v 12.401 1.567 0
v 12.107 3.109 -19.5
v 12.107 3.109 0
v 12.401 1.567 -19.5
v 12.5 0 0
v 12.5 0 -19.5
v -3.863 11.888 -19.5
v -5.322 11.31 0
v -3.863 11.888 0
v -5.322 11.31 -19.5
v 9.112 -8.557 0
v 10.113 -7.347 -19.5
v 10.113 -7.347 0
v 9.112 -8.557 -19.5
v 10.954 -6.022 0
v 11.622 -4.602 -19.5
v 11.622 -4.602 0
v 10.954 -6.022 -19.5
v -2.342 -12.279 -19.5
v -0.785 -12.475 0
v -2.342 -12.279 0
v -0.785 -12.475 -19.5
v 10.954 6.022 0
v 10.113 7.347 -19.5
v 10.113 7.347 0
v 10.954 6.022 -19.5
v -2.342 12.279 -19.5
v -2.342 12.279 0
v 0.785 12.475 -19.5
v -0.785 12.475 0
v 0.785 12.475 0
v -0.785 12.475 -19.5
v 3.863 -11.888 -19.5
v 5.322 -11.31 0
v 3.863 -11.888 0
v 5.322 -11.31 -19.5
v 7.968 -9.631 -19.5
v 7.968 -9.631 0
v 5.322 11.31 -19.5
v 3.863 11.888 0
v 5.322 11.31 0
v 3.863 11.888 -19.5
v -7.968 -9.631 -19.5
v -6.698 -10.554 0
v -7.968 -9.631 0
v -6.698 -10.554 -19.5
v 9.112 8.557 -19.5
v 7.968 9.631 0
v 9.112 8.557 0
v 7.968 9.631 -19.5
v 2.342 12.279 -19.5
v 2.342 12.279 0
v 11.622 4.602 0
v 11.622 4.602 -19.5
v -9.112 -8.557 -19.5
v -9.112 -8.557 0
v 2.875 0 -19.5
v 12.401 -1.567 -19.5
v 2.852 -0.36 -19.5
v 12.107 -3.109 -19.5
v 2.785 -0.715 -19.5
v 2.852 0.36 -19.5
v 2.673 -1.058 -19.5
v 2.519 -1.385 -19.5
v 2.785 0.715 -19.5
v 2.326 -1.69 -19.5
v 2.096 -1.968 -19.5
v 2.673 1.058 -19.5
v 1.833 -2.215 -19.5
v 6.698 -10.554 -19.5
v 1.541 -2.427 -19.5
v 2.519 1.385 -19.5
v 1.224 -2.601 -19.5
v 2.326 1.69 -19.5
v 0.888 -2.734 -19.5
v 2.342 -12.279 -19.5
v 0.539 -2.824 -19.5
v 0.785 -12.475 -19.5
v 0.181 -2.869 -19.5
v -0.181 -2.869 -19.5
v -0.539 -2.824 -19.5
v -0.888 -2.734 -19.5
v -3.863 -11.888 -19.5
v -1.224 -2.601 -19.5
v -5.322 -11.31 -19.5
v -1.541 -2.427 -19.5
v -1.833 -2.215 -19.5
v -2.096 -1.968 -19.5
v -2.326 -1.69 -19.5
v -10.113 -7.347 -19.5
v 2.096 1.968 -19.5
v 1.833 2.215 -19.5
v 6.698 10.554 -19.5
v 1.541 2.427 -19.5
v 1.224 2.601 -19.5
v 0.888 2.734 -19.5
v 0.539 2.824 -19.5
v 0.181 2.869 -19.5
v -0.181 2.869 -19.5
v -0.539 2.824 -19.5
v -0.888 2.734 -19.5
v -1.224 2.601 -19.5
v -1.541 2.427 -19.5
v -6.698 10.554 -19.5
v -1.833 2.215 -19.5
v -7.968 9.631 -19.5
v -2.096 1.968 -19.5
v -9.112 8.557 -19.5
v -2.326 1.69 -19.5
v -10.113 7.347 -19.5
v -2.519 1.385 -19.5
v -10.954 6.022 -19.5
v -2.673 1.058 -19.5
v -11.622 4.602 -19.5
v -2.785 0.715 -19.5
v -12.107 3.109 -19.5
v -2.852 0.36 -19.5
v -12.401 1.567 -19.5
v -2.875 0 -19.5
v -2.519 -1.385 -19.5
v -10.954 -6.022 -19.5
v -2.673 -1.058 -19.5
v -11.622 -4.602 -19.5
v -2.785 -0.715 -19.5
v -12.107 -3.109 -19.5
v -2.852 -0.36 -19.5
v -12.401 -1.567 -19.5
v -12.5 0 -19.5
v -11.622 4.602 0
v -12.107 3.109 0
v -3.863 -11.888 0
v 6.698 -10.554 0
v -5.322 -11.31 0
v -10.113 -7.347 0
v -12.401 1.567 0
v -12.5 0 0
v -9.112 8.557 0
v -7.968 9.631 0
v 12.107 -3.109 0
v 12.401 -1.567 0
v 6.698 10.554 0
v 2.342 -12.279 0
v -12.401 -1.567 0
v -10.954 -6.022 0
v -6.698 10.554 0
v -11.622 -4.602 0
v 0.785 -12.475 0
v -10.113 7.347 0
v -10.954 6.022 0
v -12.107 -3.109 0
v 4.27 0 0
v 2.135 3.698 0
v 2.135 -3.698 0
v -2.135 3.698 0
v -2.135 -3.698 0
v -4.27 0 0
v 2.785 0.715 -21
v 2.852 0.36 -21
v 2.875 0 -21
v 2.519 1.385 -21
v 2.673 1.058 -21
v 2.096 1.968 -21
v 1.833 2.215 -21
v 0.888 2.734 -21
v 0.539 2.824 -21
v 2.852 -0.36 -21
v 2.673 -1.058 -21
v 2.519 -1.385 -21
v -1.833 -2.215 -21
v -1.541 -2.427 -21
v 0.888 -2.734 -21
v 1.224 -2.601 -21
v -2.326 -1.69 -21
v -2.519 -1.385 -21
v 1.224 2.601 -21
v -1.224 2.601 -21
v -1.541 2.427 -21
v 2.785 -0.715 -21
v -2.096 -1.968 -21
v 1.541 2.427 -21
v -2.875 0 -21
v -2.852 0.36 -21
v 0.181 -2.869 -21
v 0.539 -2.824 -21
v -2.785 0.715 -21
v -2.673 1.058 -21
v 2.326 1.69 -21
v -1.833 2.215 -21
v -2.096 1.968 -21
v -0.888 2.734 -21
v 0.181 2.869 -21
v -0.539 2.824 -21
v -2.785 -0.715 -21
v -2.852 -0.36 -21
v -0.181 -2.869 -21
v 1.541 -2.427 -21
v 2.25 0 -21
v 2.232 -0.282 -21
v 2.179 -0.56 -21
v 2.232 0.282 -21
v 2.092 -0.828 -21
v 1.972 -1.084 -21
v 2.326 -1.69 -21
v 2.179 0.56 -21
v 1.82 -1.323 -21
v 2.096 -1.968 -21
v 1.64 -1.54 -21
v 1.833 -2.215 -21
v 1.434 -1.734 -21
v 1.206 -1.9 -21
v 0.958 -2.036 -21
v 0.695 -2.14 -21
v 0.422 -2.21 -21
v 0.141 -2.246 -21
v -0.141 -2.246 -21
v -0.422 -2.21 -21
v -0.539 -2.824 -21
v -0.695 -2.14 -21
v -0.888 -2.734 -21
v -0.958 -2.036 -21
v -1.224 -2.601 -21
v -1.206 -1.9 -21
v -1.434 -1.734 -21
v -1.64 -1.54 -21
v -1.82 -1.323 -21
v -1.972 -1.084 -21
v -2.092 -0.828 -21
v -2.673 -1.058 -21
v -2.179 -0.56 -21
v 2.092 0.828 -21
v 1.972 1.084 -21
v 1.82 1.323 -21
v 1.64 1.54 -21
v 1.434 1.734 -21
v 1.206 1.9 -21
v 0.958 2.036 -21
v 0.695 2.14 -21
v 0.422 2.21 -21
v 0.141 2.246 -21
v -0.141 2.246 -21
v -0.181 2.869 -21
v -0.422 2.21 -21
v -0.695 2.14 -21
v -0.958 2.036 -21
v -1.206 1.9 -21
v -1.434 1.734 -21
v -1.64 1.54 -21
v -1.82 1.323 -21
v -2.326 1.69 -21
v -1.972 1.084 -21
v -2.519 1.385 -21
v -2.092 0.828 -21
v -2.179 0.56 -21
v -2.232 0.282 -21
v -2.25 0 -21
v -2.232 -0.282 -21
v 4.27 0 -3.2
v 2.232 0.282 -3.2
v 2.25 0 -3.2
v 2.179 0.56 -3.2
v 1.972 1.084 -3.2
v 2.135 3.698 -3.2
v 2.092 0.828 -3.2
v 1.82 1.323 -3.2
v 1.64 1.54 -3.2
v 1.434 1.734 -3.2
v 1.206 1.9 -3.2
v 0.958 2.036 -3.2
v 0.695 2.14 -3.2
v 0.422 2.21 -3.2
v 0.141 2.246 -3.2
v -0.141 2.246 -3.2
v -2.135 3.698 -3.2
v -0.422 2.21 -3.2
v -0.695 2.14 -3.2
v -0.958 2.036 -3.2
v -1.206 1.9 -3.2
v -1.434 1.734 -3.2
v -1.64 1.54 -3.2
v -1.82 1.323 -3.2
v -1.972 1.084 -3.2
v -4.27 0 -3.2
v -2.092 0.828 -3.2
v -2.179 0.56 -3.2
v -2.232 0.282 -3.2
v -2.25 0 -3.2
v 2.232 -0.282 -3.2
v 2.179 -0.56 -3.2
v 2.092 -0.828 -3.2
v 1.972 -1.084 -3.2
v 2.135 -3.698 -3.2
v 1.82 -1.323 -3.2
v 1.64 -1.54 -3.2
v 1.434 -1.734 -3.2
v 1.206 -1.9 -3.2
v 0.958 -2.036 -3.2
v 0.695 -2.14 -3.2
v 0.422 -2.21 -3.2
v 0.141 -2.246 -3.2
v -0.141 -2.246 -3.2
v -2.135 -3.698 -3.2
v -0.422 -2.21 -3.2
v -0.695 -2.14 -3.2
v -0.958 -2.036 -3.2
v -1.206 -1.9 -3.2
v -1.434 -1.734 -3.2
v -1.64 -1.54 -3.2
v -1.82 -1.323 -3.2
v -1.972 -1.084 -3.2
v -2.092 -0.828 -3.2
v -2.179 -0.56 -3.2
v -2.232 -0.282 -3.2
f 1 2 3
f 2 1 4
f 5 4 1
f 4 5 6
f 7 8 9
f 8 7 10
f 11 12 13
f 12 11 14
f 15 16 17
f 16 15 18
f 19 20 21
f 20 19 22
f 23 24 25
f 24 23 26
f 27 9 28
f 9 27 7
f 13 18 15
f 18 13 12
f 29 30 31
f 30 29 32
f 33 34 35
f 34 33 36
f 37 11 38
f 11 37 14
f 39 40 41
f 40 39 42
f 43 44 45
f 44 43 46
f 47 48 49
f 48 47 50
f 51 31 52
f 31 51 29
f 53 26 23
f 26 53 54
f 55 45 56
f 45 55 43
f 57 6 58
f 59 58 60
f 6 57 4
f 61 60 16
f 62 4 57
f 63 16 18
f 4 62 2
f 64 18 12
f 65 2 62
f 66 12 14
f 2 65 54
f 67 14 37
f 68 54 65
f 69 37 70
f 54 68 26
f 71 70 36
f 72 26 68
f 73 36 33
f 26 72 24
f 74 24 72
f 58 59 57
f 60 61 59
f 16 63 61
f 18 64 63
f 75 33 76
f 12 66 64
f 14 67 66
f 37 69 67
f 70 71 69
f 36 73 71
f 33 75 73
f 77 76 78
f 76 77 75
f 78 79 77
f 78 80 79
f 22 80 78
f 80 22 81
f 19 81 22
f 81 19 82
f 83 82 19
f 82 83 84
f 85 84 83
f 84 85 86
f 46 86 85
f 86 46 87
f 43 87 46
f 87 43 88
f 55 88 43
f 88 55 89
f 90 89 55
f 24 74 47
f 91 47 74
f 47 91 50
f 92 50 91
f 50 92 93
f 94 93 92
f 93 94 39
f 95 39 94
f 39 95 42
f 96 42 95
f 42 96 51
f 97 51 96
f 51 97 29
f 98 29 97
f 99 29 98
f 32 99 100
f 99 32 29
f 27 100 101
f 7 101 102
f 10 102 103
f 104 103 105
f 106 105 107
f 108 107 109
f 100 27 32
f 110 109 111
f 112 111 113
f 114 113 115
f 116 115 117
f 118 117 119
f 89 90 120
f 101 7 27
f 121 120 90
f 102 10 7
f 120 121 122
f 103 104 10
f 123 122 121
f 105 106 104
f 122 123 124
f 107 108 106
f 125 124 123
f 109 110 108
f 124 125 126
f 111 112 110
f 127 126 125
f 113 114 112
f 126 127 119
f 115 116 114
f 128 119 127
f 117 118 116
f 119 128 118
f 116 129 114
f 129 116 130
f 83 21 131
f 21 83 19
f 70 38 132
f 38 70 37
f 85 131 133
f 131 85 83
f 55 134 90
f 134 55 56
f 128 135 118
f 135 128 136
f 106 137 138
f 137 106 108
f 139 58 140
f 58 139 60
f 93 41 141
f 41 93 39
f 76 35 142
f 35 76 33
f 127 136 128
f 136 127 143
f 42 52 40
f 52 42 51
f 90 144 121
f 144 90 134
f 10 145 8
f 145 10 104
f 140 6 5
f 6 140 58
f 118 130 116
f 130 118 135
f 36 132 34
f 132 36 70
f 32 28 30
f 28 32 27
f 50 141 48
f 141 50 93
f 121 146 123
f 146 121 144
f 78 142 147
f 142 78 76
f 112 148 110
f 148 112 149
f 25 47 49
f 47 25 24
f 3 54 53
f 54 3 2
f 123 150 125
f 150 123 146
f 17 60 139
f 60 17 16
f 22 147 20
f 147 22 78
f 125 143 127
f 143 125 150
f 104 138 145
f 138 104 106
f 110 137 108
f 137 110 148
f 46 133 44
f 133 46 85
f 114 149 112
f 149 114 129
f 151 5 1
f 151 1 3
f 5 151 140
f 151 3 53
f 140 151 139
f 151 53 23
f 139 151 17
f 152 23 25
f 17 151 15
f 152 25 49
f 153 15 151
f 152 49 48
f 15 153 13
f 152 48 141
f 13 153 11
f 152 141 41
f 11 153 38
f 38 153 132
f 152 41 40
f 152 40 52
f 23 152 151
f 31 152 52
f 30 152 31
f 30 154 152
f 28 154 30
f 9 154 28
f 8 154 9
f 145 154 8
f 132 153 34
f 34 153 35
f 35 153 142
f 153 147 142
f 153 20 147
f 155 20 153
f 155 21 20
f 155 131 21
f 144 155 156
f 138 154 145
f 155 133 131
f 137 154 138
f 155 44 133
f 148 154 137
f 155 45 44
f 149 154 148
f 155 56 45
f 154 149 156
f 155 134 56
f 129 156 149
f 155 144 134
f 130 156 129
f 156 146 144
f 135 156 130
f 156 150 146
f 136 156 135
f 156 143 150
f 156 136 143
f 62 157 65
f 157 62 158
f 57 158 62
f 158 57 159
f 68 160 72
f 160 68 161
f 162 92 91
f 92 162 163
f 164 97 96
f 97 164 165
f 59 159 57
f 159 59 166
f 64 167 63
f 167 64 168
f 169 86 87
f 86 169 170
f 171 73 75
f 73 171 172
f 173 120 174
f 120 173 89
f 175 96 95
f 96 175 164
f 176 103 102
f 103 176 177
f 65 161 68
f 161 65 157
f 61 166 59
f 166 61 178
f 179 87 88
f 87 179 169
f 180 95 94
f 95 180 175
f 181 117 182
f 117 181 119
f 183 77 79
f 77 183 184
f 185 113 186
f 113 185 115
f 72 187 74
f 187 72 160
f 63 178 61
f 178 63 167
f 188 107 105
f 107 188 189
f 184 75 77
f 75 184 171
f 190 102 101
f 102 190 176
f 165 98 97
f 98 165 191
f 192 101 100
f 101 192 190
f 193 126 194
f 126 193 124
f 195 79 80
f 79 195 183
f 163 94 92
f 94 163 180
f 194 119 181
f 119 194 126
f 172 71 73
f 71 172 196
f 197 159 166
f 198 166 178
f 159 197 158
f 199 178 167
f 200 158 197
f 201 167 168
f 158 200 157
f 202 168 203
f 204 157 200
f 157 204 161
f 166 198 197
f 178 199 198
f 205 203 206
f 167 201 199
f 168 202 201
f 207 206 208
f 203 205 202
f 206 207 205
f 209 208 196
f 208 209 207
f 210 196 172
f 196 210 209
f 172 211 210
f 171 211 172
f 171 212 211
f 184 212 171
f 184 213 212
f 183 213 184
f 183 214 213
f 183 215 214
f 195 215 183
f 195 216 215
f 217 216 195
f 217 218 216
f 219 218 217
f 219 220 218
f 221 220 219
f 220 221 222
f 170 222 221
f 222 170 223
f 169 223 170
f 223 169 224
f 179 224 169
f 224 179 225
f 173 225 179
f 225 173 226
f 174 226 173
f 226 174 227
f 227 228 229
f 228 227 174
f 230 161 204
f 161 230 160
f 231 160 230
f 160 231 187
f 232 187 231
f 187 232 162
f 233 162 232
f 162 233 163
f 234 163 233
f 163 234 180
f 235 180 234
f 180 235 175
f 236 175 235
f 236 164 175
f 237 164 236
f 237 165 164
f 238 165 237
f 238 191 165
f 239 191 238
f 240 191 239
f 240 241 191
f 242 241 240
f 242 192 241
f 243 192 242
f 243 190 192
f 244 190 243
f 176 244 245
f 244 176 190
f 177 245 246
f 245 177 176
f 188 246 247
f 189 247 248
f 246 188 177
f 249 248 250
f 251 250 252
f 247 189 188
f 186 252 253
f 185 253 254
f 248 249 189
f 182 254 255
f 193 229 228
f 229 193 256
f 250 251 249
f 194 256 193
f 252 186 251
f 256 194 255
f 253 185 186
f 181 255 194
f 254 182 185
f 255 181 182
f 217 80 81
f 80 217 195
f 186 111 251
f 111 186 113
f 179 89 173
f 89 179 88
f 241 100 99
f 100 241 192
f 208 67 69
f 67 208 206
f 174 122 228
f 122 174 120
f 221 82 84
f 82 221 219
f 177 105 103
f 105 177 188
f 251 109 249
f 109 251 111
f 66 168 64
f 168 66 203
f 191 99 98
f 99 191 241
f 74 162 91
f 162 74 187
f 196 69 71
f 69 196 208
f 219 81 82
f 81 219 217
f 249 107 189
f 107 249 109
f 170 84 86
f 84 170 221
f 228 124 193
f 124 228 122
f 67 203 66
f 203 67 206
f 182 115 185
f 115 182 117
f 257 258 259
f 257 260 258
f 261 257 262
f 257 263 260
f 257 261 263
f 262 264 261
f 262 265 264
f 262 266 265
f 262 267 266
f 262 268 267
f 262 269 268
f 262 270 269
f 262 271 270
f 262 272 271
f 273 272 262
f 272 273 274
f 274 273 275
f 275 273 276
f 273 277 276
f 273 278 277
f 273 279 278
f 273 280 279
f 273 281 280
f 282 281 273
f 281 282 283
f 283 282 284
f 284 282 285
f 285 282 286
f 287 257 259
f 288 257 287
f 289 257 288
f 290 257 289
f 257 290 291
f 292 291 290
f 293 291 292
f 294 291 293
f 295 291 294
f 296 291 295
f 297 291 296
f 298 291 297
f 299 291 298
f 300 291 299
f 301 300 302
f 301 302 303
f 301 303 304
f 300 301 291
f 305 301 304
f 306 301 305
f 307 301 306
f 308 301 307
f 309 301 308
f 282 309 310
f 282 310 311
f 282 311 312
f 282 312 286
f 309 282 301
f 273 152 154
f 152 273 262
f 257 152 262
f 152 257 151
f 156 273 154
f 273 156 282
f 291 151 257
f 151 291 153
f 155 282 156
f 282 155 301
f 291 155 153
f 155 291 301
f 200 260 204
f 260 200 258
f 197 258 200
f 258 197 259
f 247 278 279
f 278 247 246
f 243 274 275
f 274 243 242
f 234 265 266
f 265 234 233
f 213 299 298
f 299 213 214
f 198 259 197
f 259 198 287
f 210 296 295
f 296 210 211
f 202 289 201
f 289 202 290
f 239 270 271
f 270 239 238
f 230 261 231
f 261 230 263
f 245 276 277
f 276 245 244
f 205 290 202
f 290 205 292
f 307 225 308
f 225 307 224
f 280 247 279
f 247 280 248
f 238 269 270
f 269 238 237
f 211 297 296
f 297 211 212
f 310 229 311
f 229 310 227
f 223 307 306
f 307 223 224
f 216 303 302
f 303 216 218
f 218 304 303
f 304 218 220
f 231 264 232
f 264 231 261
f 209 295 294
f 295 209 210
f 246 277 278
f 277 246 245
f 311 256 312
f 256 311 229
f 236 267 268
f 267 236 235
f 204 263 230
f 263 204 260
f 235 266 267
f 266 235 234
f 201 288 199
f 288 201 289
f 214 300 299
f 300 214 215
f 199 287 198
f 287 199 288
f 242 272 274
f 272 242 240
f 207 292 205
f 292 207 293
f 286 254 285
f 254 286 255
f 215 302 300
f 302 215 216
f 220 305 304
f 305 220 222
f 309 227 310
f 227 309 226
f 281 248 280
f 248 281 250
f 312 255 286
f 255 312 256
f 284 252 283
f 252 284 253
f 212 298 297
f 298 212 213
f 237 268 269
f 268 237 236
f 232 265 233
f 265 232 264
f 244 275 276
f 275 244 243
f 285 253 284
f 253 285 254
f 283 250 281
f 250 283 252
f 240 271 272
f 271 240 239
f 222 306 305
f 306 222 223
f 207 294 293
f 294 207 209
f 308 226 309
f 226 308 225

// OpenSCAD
$fn = 50;

difference() {
	union() {
		translate(v = [0, 0, -19.5]) {
			cylinder(h = 19.5, r = 12.5);
		}
		#translate(v = [0, 0, -21.0]) {
			cylinder(h = 21, r = 2.875);
		}
	}
	union() {
		translate(v = [0, 0, 0]) {
			rotate(a = [0, 0, 0]) {
				difference() {
					union() {
						translate(v = [0, 0, -3.2]) {
							linear_extrude(height = 3.2) {
								polygon(points = [[4.2698, 0.0], [2.1349000000000005, 3.697755269078796], [-2.134899999999999, 3.6977552690787965], [-4.2698, 5.228996902999369e-16], [-2.134900000000002, -3.6977552690787956], [2.1348999999999974, -3.697755269078798]]);
							}
						}
					}
					union();
				}
			}
		}
		#translate(v = [0, 0, -100.0]) {
			cylinder(h = 200, r = 2.25);
		}
	}
}
